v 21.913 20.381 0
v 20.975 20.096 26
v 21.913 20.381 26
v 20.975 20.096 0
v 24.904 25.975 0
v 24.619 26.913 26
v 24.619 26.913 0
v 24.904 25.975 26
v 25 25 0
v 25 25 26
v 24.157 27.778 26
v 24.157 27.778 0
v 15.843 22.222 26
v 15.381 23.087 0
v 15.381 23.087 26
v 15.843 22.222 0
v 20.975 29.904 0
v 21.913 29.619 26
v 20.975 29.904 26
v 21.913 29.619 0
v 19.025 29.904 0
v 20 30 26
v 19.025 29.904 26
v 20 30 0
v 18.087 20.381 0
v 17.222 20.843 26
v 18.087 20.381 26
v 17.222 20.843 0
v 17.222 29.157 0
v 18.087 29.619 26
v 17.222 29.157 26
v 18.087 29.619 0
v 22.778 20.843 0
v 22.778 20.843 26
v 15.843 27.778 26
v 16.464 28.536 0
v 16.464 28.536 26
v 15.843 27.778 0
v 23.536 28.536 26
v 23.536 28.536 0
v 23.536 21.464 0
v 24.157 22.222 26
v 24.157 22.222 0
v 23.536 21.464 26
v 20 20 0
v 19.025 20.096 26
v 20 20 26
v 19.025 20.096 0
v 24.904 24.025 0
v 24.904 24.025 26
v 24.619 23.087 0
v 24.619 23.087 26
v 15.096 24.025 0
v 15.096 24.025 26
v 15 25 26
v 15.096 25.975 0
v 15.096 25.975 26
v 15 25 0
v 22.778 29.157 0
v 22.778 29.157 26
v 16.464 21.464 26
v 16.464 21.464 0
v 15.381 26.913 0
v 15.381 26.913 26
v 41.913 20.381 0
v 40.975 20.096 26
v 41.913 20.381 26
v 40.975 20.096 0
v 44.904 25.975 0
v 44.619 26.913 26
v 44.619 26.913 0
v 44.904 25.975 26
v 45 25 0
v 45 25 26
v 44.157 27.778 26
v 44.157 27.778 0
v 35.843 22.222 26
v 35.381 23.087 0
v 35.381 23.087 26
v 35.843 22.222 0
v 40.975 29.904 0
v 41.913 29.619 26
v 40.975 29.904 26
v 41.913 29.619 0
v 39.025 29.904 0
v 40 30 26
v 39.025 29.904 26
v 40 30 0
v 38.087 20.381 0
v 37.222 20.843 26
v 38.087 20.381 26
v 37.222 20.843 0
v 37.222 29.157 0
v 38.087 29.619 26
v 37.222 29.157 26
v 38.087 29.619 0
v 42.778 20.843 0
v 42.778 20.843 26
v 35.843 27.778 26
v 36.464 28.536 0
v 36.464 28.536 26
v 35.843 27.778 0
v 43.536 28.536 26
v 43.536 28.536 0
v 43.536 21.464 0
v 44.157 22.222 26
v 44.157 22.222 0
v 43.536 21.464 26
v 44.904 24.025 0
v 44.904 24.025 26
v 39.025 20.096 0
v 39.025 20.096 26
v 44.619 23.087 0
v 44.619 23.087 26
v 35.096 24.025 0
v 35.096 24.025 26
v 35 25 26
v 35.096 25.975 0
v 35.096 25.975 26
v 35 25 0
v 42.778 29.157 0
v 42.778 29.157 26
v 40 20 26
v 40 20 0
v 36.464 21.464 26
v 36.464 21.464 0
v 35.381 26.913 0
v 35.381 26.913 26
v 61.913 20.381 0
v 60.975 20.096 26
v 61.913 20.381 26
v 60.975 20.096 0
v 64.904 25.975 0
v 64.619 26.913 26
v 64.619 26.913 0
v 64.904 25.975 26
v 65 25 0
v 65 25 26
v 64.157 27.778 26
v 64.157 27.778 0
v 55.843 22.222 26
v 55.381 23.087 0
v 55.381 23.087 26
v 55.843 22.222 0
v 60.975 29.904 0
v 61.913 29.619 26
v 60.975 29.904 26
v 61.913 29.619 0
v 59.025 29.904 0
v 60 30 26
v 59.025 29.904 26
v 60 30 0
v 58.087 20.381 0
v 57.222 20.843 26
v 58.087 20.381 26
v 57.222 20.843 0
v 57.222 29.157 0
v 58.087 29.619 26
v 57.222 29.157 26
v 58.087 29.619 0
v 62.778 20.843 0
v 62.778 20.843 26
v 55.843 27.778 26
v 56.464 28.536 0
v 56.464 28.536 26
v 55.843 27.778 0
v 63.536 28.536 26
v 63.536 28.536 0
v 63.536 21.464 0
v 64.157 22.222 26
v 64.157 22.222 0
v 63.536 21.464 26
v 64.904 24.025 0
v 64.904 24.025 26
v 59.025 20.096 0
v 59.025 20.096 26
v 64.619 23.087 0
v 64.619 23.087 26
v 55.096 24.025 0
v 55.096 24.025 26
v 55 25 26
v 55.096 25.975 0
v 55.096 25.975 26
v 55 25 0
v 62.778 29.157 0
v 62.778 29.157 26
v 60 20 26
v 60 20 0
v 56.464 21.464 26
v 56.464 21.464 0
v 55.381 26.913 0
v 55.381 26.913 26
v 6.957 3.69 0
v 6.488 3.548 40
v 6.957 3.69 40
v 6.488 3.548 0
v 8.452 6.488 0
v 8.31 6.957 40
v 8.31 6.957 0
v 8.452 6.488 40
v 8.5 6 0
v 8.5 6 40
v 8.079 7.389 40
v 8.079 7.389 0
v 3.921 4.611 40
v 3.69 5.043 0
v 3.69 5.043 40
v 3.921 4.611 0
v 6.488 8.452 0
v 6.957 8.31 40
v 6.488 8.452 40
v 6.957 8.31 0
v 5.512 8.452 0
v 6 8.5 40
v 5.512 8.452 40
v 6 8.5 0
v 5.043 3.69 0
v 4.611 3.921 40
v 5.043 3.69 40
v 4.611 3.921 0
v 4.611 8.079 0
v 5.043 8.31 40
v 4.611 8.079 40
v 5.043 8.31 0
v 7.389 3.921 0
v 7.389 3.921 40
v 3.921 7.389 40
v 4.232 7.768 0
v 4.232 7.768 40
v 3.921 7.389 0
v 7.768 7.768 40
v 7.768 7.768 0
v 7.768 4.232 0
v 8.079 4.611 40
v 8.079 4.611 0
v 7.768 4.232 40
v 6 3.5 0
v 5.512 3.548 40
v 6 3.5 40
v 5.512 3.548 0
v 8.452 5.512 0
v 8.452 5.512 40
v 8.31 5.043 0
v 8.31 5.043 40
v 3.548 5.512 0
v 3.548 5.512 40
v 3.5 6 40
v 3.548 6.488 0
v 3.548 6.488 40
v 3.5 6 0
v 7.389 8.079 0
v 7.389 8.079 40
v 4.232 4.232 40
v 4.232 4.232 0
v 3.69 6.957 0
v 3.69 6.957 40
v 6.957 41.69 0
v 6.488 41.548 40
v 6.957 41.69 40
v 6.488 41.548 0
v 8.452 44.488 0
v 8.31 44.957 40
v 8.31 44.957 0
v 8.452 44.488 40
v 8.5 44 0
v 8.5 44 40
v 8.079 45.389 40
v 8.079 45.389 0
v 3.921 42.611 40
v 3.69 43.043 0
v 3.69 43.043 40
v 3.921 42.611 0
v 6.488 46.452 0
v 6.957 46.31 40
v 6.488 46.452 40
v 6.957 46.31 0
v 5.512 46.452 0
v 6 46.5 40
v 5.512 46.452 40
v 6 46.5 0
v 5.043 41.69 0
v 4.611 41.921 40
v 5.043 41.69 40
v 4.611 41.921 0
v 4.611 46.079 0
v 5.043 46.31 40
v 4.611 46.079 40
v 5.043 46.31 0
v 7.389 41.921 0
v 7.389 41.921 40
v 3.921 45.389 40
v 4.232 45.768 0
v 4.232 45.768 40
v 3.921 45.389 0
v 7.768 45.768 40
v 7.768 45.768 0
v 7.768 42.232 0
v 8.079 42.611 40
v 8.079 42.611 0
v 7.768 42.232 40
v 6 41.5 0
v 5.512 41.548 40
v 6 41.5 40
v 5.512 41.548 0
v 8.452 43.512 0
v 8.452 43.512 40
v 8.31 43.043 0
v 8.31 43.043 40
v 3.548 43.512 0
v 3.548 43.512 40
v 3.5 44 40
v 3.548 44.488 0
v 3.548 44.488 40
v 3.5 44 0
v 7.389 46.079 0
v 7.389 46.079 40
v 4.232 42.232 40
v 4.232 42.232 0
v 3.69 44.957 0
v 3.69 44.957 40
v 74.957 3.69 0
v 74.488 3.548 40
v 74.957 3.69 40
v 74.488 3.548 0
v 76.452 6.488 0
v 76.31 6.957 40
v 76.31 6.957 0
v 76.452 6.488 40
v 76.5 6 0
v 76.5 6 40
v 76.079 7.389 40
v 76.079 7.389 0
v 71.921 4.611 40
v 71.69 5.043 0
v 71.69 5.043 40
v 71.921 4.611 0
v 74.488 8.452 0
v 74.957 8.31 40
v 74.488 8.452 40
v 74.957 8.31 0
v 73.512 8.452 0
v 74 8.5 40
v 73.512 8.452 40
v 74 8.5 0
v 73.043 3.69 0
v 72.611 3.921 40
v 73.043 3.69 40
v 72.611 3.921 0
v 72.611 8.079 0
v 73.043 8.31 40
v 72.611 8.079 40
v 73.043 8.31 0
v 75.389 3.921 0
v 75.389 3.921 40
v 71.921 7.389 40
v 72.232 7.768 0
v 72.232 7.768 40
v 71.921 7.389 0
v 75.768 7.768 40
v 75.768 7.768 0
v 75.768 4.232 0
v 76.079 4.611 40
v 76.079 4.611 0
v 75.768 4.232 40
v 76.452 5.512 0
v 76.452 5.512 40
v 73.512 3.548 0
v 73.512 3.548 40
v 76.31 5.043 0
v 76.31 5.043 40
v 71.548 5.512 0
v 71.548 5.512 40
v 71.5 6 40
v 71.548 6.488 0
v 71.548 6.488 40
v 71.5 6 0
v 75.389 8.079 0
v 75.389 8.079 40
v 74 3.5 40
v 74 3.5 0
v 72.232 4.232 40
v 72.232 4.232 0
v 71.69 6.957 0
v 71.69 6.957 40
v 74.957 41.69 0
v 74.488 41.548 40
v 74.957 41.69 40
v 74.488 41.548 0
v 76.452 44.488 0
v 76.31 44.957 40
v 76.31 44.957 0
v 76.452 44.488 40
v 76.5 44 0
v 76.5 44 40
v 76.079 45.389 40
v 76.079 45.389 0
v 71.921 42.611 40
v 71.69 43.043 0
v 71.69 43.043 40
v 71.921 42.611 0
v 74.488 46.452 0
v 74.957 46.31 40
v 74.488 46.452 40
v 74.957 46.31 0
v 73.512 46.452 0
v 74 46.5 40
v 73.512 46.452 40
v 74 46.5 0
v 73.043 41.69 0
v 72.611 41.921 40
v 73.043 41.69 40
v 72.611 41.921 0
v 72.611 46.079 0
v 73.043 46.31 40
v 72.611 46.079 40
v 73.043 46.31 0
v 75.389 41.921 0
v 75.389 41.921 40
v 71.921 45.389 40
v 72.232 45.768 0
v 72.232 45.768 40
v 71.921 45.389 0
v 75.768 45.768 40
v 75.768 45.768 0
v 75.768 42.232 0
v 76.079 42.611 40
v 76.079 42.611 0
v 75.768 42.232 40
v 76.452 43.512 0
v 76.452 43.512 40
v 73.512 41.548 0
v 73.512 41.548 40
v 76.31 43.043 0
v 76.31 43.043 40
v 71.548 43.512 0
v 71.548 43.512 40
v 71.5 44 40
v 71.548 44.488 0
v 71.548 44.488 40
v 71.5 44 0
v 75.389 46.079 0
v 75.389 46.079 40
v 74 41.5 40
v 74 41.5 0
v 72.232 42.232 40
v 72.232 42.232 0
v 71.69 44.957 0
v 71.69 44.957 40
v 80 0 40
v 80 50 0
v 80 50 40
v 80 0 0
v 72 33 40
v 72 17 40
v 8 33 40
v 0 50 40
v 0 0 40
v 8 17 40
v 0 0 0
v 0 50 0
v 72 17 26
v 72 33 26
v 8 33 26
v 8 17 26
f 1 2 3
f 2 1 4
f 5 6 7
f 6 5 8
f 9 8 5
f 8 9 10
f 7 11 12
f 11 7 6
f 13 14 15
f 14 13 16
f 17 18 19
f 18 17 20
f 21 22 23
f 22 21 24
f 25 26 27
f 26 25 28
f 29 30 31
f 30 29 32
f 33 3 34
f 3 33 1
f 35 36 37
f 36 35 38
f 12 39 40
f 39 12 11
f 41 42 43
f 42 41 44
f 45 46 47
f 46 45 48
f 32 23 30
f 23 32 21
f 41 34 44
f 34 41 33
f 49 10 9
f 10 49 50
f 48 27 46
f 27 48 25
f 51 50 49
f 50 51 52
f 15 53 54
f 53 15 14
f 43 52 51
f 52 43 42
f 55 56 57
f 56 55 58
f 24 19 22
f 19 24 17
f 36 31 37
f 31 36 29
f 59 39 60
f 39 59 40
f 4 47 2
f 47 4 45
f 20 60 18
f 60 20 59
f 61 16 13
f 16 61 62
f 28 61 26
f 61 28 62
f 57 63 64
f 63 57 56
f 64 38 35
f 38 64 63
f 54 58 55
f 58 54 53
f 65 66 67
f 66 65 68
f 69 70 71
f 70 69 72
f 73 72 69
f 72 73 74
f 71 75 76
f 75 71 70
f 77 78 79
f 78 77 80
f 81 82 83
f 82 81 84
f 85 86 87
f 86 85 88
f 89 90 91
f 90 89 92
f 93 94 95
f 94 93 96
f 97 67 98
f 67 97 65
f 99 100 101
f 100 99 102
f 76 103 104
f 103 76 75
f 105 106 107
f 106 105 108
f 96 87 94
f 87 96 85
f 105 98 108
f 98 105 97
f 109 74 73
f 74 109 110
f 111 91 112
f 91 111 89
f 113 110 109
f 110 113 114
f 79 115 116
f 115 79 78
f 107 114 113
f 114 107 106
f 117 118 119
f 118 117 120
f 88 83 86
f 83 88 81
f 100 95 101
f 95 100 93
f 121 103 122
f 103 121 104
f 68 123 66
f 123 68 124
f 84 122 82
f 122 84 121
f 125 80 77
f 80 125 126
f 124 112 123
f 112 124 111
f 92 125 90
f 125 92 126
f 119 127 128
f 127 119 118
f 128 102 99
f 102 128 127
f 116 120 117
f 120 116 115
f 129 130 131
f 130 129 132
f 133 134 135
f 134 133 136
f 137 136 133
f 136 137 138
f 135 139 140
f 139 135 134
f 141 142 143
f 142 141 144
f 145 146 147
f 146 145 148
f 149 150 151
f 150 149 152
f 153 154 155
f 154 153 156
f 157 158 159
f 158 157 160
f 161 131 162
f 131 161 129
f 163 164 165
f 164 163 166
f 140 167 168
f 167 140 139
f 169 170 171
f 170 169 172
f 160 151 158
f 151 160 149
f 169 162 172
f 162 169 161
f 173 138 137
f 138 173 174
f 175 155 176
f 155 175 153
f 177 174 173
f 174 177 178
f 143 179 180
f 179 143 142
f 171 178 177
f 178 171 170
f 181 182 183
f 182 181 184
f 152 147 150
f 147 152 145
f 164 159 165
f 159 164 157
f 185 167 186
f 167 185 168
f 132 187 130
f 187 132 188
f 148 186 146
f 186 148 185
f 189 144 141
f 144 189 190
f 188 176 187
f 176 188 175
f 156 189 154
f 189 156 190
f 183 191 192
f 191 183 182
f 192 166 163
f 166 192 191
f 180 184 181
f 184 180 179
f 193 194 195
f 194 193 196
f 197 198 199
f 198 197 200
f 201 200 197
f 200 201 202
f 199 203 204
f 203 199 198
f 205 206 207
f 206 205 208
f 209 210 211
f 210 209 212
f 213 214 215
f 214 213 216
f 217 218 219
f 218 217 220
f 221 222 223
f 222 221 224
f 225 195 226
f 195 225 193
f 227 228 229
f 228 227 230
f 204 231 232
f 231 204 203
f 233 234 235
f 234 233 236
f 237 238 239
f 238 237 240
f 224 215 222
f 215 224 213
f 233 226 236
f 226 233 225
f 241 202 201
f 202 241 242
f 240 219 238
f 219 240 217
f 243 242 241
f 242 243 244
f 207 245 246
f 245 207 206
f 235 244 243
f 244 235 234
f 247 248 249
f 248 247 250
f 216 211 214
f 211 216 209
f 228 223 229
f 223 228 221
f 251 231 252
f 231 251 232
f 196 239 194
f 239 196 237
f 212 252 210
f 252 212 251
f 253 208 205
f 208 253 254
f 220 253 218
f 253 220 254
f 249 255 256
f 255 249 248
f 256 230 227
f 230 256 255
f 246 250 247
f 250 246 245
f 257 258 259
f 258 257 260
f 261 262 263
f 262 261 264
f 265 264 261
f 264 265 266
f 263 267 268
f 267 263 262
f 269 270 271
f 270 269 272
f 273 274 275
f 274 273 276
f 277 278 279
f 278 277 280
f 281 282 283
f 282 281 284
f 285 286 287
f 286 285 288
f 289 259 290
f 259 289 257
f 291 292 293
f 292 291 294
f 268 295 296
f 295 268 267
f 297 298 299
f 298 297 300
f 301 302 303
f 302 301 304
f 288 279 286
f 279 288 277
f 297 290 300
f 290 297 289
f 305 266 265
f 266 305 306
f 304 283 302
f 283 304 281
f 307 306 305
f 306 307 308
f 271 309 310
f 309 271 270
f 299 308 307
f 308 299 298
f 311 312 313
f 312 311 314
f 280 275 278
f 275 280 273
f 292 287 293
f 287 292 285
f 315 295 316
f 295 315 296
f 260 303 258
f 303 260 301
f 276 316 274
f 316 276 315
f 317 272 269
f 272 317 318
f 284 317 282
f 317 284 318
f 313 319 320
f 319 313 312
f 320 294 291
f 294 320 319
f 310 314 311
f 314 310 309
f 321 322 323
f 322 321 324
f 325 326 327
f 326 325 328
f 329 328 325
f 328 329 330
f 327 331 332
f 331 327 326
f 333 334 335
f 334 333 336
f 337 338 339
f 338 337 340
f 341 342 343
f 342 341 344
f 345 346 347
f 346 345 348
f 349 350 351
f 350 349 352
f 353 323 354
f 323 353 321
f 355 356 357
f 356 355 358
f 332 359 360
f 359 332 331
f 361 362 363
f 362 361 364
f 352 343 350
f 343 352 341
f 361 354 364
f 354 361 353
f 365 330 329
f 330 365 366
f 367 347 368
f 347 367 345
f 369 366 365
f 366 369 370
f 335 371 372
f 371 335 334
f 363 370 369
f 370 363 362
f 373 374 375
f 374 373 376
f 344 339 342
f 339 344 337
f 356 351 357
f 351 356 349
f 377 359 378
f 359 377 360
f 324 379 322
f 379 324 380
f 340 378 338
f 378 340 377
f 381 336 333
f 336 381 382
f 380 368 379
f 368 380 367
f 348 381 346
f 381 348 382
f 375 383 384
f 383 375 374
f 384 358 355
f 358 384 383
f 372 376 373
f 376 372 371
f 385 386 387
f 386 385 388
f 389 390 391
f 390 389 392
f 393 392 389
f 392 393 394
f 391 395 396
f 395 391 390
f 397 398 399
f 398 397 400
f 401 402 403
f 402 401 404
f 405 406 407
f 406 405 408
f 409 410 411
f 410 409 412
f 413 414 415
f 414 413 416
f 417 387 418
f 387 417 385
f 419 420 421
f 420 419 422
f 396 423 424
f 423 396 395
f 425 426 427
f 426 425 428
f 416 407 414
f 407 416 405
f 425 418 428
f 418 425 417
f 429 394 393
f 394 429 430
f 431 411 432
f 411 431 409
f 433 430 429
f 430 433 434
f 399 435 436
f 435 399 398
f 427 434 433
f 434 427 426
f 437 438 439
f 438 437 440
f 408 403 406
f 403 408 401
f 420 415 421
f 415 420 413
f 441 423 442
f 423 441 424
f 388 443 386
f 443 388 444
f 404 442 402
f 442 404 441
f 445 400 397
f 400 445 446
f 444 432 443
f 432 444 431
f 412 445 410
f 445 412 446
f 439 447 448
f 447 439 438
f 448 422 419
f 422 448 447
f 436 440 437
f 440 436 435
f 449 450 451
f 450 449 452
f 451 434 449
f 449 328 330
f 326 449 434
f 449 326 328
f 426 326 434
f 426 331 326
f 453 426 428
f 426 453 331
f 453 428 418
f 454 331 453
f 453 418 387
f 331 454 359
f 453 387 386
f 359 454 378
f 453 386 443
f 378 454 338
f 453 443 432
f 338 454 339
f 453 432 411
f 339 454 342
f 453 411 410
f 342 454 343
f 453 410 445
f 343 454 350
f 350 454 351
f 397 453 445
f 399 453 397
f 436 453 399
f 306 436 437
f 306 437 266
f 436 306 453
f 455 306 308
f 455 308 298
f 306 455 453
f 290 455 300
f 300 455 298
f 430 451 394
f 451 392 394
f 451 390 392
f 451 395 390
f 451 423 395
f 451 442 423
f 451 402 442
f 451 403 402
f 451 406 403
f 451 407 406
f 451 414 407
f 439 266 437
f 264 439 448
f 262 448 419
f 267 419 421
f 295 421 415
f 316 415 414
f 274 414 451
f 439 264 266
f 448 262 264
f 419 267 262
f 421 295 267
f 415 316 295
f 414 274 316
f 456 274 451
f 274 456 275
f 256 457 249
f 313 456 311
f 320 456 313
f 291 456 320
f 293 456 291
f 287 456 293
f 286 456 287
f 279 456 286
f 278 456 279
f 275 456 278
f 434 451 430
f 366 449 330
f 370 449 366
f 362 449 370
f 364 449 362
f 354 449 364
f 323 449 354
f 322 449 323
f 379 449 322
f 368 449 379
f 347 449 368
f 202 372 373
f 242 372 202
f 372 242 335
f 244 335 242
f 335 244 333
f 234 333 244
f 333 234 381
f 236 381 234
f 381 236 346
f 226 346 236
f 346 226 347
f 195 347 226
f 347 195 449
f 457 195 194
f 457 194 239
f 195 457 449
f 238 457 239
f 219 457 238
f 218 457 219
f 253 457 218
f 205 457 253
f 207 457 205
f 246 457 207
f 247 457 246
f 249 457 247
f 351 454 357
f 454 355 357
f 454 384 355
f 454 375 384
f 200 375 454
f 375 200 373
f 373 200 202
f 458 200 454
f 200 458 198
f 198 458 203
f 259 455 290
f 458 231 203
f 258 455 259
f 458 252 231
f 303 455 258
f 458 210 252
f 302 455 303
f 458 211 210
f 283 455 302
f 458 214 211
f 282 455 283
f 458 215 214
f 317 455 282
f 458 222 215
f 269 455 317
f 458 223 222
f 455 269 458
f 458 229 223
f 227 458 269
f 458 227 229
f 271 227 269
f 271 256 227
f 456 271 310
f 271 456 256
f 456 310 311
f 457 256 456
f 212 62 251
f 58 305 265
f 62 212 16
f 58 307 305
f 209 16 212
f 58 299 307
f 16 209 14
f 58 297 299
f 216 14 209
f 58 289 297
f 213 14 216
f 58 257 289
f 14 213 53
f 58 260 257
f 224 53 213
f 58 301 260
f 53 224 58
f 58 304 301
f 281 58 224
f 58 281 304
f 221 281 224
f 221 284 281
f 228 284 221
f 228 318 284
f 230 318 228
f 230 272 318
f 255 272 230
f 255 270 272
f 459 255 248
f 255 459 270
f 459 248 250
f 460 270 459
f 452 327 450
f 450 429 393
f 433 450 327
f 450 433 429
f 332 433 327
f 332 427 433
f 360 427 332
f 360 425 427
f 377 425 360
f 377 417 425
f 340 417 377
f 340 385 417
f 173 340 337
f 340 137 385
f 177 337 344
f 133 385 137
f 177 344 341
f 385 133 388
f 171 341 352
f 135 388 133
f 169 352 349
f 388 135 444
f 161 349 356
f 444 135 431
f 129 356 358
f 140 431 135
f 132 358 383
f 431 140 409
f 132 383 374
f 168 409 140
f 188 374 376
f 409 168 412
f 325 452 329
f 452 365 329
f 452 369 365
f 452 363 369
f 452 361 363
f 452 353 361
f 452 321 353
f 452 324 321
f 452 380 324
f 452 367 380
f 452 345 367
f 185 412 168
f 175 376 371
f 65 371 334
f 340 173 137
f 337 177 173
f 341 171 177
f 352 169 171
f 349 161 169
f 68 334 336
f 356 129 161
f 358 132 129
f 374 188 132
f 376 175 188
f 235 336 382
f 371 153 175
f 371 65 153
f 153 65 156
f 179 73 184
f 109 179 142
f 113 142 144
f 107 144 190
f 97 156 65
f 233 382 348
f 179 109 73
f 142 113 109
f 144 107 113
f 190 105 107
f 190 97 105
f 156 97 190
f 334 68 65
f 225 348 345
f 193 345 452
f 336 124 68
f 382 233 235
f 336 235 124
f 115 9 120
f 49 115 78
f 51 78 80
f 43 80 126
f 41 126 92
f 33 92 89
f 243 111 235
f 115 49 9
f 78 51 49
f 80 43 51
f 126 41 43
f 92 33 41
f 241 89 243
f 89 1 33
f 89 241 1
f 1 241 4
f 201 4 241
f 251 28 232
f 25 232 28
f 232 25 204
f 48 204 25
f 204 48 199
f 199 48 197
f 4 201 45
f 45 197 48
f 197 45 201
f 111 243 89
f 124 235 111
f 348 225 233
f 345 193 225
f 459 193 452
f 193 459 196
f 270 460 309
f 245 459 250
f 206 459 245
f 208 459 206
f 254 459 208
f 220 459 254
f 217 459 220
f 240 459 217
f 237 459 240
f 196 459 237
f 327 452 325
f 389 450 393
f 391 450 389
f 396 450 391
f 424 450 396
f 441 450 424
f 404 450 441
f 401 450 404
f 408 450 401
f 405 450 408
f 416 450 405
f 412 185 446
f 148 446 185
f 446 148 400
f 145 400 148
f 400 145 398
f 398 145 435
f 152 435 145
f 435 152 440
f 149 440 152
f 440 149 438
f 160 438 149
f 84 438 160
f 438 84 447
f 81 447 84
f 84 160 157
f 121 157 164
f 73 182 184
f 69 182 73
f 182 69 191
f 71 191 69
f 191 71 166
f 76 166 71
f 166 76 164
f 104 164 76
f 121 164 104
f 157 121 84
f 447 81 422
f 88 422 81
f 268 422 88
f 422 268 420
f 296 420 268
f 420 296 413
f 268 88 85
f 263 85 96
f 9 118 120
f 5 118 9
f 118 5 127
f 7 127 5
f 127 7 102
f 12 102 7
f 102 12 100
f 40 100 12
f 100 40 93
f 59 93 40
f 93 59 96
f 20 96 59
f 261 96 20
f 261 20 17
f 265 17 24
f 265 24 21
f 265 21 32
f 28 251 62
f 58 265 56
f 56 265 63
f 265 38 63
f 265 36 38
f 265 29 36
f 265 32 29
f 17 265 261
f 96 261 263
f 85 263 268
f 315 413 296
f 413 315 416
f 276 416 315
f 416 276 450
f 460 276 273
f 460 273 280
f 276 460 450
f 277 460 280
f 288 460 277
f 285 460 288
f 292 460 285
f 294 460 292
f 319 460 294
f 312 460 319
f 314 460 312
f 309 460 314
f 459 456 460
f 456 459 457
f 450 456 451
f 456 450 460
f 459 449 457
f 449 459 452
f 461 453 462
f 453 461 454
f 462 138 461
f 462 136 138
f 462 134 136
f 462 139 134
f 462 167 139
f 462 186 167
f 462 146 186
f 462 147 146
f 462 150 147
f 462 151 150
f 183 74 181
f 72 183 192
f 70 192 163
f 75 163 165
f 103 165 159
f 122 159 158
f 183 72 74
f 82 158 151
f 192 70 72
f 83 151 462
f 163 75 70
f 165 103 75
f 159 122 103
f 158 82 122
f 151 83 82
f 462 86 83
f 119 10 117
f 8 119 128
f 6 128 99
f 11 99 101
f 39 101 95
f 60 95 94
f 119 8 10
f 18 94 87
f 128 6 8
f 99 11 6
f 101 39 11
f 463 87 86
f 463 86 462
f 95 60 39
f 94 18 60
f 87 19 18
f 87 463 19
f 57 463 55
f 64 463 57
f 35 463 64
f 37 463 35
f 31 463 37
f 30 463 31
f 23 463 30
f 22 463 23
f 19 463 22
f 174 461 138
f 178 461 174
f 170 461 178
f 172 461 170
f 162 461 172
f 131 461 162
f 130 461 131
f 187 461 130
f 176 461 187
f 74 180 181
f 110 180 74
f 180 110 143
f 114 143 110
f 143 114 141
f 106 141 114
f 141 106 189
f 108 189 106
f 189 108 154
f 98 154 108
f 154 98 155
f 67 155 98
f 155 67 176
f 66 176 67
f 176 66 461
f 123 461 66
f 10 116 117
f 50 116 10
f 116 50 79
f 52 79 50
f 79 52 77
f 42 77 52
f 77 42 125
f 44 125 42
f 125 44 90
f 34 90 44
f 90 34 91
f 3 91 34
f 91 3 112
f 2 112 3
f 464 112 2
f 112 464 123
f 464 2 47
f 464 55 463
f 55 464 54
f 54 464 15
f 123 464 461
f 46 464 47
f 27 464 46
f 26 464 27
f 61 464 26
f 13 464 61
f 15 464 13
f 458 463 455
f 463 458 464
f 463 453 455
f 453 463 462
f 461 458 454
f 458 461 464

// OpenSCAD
$fn = 32;

// ----------------------------------------------------------------------
// Manifold block: gallery_top manifold
// ----------------------------------------------------------------------

// --- parameters (mm) ---
block_l = 80;             // block length, X
block_w = 50;             // block width, Y
block_h = 40;             // block height, Z
port_d = 10;              // port bore diameter
port_pitch = 20;          // port pitch along X
gallery_d = 16;           // top gallery width, Y
gallery_depth = 14;       // gallery pocket depth
wall_p = 8;               // gallery end wall thickness, X
mnt_d = 5;                // mounting hole diameter
mnt_in = 6;               // mounting hole inset from the edges

n_ports = 3;  // ports in the row
port_x0 = (block_l - (n_ports - 1) * port_pitch) / 2;  // first port X

difference() {
  cube([block_l, block_w, block_h]);
  for (i = [0 : n_ports - 1])
    translate([port_x0 + i * port_pitch, block_w / 2, -1])
      cylinder(h = block_h + 2, d = port_d);
  translate([wall_p, block_w / 2 - gallery_d / 2, block_h - gallery_depth])
    cube([block_l - 2 * wall_p, gallery_d, gallery_depth + 1]);
  for (cx = [mnt_in, block_l - mnt_in])
    for (cy = [mnt_in, block_w - mnt_in])
      translate([cx, cy, -1]) cylinder(h = block_h + 2, d = mnt_d);
}
